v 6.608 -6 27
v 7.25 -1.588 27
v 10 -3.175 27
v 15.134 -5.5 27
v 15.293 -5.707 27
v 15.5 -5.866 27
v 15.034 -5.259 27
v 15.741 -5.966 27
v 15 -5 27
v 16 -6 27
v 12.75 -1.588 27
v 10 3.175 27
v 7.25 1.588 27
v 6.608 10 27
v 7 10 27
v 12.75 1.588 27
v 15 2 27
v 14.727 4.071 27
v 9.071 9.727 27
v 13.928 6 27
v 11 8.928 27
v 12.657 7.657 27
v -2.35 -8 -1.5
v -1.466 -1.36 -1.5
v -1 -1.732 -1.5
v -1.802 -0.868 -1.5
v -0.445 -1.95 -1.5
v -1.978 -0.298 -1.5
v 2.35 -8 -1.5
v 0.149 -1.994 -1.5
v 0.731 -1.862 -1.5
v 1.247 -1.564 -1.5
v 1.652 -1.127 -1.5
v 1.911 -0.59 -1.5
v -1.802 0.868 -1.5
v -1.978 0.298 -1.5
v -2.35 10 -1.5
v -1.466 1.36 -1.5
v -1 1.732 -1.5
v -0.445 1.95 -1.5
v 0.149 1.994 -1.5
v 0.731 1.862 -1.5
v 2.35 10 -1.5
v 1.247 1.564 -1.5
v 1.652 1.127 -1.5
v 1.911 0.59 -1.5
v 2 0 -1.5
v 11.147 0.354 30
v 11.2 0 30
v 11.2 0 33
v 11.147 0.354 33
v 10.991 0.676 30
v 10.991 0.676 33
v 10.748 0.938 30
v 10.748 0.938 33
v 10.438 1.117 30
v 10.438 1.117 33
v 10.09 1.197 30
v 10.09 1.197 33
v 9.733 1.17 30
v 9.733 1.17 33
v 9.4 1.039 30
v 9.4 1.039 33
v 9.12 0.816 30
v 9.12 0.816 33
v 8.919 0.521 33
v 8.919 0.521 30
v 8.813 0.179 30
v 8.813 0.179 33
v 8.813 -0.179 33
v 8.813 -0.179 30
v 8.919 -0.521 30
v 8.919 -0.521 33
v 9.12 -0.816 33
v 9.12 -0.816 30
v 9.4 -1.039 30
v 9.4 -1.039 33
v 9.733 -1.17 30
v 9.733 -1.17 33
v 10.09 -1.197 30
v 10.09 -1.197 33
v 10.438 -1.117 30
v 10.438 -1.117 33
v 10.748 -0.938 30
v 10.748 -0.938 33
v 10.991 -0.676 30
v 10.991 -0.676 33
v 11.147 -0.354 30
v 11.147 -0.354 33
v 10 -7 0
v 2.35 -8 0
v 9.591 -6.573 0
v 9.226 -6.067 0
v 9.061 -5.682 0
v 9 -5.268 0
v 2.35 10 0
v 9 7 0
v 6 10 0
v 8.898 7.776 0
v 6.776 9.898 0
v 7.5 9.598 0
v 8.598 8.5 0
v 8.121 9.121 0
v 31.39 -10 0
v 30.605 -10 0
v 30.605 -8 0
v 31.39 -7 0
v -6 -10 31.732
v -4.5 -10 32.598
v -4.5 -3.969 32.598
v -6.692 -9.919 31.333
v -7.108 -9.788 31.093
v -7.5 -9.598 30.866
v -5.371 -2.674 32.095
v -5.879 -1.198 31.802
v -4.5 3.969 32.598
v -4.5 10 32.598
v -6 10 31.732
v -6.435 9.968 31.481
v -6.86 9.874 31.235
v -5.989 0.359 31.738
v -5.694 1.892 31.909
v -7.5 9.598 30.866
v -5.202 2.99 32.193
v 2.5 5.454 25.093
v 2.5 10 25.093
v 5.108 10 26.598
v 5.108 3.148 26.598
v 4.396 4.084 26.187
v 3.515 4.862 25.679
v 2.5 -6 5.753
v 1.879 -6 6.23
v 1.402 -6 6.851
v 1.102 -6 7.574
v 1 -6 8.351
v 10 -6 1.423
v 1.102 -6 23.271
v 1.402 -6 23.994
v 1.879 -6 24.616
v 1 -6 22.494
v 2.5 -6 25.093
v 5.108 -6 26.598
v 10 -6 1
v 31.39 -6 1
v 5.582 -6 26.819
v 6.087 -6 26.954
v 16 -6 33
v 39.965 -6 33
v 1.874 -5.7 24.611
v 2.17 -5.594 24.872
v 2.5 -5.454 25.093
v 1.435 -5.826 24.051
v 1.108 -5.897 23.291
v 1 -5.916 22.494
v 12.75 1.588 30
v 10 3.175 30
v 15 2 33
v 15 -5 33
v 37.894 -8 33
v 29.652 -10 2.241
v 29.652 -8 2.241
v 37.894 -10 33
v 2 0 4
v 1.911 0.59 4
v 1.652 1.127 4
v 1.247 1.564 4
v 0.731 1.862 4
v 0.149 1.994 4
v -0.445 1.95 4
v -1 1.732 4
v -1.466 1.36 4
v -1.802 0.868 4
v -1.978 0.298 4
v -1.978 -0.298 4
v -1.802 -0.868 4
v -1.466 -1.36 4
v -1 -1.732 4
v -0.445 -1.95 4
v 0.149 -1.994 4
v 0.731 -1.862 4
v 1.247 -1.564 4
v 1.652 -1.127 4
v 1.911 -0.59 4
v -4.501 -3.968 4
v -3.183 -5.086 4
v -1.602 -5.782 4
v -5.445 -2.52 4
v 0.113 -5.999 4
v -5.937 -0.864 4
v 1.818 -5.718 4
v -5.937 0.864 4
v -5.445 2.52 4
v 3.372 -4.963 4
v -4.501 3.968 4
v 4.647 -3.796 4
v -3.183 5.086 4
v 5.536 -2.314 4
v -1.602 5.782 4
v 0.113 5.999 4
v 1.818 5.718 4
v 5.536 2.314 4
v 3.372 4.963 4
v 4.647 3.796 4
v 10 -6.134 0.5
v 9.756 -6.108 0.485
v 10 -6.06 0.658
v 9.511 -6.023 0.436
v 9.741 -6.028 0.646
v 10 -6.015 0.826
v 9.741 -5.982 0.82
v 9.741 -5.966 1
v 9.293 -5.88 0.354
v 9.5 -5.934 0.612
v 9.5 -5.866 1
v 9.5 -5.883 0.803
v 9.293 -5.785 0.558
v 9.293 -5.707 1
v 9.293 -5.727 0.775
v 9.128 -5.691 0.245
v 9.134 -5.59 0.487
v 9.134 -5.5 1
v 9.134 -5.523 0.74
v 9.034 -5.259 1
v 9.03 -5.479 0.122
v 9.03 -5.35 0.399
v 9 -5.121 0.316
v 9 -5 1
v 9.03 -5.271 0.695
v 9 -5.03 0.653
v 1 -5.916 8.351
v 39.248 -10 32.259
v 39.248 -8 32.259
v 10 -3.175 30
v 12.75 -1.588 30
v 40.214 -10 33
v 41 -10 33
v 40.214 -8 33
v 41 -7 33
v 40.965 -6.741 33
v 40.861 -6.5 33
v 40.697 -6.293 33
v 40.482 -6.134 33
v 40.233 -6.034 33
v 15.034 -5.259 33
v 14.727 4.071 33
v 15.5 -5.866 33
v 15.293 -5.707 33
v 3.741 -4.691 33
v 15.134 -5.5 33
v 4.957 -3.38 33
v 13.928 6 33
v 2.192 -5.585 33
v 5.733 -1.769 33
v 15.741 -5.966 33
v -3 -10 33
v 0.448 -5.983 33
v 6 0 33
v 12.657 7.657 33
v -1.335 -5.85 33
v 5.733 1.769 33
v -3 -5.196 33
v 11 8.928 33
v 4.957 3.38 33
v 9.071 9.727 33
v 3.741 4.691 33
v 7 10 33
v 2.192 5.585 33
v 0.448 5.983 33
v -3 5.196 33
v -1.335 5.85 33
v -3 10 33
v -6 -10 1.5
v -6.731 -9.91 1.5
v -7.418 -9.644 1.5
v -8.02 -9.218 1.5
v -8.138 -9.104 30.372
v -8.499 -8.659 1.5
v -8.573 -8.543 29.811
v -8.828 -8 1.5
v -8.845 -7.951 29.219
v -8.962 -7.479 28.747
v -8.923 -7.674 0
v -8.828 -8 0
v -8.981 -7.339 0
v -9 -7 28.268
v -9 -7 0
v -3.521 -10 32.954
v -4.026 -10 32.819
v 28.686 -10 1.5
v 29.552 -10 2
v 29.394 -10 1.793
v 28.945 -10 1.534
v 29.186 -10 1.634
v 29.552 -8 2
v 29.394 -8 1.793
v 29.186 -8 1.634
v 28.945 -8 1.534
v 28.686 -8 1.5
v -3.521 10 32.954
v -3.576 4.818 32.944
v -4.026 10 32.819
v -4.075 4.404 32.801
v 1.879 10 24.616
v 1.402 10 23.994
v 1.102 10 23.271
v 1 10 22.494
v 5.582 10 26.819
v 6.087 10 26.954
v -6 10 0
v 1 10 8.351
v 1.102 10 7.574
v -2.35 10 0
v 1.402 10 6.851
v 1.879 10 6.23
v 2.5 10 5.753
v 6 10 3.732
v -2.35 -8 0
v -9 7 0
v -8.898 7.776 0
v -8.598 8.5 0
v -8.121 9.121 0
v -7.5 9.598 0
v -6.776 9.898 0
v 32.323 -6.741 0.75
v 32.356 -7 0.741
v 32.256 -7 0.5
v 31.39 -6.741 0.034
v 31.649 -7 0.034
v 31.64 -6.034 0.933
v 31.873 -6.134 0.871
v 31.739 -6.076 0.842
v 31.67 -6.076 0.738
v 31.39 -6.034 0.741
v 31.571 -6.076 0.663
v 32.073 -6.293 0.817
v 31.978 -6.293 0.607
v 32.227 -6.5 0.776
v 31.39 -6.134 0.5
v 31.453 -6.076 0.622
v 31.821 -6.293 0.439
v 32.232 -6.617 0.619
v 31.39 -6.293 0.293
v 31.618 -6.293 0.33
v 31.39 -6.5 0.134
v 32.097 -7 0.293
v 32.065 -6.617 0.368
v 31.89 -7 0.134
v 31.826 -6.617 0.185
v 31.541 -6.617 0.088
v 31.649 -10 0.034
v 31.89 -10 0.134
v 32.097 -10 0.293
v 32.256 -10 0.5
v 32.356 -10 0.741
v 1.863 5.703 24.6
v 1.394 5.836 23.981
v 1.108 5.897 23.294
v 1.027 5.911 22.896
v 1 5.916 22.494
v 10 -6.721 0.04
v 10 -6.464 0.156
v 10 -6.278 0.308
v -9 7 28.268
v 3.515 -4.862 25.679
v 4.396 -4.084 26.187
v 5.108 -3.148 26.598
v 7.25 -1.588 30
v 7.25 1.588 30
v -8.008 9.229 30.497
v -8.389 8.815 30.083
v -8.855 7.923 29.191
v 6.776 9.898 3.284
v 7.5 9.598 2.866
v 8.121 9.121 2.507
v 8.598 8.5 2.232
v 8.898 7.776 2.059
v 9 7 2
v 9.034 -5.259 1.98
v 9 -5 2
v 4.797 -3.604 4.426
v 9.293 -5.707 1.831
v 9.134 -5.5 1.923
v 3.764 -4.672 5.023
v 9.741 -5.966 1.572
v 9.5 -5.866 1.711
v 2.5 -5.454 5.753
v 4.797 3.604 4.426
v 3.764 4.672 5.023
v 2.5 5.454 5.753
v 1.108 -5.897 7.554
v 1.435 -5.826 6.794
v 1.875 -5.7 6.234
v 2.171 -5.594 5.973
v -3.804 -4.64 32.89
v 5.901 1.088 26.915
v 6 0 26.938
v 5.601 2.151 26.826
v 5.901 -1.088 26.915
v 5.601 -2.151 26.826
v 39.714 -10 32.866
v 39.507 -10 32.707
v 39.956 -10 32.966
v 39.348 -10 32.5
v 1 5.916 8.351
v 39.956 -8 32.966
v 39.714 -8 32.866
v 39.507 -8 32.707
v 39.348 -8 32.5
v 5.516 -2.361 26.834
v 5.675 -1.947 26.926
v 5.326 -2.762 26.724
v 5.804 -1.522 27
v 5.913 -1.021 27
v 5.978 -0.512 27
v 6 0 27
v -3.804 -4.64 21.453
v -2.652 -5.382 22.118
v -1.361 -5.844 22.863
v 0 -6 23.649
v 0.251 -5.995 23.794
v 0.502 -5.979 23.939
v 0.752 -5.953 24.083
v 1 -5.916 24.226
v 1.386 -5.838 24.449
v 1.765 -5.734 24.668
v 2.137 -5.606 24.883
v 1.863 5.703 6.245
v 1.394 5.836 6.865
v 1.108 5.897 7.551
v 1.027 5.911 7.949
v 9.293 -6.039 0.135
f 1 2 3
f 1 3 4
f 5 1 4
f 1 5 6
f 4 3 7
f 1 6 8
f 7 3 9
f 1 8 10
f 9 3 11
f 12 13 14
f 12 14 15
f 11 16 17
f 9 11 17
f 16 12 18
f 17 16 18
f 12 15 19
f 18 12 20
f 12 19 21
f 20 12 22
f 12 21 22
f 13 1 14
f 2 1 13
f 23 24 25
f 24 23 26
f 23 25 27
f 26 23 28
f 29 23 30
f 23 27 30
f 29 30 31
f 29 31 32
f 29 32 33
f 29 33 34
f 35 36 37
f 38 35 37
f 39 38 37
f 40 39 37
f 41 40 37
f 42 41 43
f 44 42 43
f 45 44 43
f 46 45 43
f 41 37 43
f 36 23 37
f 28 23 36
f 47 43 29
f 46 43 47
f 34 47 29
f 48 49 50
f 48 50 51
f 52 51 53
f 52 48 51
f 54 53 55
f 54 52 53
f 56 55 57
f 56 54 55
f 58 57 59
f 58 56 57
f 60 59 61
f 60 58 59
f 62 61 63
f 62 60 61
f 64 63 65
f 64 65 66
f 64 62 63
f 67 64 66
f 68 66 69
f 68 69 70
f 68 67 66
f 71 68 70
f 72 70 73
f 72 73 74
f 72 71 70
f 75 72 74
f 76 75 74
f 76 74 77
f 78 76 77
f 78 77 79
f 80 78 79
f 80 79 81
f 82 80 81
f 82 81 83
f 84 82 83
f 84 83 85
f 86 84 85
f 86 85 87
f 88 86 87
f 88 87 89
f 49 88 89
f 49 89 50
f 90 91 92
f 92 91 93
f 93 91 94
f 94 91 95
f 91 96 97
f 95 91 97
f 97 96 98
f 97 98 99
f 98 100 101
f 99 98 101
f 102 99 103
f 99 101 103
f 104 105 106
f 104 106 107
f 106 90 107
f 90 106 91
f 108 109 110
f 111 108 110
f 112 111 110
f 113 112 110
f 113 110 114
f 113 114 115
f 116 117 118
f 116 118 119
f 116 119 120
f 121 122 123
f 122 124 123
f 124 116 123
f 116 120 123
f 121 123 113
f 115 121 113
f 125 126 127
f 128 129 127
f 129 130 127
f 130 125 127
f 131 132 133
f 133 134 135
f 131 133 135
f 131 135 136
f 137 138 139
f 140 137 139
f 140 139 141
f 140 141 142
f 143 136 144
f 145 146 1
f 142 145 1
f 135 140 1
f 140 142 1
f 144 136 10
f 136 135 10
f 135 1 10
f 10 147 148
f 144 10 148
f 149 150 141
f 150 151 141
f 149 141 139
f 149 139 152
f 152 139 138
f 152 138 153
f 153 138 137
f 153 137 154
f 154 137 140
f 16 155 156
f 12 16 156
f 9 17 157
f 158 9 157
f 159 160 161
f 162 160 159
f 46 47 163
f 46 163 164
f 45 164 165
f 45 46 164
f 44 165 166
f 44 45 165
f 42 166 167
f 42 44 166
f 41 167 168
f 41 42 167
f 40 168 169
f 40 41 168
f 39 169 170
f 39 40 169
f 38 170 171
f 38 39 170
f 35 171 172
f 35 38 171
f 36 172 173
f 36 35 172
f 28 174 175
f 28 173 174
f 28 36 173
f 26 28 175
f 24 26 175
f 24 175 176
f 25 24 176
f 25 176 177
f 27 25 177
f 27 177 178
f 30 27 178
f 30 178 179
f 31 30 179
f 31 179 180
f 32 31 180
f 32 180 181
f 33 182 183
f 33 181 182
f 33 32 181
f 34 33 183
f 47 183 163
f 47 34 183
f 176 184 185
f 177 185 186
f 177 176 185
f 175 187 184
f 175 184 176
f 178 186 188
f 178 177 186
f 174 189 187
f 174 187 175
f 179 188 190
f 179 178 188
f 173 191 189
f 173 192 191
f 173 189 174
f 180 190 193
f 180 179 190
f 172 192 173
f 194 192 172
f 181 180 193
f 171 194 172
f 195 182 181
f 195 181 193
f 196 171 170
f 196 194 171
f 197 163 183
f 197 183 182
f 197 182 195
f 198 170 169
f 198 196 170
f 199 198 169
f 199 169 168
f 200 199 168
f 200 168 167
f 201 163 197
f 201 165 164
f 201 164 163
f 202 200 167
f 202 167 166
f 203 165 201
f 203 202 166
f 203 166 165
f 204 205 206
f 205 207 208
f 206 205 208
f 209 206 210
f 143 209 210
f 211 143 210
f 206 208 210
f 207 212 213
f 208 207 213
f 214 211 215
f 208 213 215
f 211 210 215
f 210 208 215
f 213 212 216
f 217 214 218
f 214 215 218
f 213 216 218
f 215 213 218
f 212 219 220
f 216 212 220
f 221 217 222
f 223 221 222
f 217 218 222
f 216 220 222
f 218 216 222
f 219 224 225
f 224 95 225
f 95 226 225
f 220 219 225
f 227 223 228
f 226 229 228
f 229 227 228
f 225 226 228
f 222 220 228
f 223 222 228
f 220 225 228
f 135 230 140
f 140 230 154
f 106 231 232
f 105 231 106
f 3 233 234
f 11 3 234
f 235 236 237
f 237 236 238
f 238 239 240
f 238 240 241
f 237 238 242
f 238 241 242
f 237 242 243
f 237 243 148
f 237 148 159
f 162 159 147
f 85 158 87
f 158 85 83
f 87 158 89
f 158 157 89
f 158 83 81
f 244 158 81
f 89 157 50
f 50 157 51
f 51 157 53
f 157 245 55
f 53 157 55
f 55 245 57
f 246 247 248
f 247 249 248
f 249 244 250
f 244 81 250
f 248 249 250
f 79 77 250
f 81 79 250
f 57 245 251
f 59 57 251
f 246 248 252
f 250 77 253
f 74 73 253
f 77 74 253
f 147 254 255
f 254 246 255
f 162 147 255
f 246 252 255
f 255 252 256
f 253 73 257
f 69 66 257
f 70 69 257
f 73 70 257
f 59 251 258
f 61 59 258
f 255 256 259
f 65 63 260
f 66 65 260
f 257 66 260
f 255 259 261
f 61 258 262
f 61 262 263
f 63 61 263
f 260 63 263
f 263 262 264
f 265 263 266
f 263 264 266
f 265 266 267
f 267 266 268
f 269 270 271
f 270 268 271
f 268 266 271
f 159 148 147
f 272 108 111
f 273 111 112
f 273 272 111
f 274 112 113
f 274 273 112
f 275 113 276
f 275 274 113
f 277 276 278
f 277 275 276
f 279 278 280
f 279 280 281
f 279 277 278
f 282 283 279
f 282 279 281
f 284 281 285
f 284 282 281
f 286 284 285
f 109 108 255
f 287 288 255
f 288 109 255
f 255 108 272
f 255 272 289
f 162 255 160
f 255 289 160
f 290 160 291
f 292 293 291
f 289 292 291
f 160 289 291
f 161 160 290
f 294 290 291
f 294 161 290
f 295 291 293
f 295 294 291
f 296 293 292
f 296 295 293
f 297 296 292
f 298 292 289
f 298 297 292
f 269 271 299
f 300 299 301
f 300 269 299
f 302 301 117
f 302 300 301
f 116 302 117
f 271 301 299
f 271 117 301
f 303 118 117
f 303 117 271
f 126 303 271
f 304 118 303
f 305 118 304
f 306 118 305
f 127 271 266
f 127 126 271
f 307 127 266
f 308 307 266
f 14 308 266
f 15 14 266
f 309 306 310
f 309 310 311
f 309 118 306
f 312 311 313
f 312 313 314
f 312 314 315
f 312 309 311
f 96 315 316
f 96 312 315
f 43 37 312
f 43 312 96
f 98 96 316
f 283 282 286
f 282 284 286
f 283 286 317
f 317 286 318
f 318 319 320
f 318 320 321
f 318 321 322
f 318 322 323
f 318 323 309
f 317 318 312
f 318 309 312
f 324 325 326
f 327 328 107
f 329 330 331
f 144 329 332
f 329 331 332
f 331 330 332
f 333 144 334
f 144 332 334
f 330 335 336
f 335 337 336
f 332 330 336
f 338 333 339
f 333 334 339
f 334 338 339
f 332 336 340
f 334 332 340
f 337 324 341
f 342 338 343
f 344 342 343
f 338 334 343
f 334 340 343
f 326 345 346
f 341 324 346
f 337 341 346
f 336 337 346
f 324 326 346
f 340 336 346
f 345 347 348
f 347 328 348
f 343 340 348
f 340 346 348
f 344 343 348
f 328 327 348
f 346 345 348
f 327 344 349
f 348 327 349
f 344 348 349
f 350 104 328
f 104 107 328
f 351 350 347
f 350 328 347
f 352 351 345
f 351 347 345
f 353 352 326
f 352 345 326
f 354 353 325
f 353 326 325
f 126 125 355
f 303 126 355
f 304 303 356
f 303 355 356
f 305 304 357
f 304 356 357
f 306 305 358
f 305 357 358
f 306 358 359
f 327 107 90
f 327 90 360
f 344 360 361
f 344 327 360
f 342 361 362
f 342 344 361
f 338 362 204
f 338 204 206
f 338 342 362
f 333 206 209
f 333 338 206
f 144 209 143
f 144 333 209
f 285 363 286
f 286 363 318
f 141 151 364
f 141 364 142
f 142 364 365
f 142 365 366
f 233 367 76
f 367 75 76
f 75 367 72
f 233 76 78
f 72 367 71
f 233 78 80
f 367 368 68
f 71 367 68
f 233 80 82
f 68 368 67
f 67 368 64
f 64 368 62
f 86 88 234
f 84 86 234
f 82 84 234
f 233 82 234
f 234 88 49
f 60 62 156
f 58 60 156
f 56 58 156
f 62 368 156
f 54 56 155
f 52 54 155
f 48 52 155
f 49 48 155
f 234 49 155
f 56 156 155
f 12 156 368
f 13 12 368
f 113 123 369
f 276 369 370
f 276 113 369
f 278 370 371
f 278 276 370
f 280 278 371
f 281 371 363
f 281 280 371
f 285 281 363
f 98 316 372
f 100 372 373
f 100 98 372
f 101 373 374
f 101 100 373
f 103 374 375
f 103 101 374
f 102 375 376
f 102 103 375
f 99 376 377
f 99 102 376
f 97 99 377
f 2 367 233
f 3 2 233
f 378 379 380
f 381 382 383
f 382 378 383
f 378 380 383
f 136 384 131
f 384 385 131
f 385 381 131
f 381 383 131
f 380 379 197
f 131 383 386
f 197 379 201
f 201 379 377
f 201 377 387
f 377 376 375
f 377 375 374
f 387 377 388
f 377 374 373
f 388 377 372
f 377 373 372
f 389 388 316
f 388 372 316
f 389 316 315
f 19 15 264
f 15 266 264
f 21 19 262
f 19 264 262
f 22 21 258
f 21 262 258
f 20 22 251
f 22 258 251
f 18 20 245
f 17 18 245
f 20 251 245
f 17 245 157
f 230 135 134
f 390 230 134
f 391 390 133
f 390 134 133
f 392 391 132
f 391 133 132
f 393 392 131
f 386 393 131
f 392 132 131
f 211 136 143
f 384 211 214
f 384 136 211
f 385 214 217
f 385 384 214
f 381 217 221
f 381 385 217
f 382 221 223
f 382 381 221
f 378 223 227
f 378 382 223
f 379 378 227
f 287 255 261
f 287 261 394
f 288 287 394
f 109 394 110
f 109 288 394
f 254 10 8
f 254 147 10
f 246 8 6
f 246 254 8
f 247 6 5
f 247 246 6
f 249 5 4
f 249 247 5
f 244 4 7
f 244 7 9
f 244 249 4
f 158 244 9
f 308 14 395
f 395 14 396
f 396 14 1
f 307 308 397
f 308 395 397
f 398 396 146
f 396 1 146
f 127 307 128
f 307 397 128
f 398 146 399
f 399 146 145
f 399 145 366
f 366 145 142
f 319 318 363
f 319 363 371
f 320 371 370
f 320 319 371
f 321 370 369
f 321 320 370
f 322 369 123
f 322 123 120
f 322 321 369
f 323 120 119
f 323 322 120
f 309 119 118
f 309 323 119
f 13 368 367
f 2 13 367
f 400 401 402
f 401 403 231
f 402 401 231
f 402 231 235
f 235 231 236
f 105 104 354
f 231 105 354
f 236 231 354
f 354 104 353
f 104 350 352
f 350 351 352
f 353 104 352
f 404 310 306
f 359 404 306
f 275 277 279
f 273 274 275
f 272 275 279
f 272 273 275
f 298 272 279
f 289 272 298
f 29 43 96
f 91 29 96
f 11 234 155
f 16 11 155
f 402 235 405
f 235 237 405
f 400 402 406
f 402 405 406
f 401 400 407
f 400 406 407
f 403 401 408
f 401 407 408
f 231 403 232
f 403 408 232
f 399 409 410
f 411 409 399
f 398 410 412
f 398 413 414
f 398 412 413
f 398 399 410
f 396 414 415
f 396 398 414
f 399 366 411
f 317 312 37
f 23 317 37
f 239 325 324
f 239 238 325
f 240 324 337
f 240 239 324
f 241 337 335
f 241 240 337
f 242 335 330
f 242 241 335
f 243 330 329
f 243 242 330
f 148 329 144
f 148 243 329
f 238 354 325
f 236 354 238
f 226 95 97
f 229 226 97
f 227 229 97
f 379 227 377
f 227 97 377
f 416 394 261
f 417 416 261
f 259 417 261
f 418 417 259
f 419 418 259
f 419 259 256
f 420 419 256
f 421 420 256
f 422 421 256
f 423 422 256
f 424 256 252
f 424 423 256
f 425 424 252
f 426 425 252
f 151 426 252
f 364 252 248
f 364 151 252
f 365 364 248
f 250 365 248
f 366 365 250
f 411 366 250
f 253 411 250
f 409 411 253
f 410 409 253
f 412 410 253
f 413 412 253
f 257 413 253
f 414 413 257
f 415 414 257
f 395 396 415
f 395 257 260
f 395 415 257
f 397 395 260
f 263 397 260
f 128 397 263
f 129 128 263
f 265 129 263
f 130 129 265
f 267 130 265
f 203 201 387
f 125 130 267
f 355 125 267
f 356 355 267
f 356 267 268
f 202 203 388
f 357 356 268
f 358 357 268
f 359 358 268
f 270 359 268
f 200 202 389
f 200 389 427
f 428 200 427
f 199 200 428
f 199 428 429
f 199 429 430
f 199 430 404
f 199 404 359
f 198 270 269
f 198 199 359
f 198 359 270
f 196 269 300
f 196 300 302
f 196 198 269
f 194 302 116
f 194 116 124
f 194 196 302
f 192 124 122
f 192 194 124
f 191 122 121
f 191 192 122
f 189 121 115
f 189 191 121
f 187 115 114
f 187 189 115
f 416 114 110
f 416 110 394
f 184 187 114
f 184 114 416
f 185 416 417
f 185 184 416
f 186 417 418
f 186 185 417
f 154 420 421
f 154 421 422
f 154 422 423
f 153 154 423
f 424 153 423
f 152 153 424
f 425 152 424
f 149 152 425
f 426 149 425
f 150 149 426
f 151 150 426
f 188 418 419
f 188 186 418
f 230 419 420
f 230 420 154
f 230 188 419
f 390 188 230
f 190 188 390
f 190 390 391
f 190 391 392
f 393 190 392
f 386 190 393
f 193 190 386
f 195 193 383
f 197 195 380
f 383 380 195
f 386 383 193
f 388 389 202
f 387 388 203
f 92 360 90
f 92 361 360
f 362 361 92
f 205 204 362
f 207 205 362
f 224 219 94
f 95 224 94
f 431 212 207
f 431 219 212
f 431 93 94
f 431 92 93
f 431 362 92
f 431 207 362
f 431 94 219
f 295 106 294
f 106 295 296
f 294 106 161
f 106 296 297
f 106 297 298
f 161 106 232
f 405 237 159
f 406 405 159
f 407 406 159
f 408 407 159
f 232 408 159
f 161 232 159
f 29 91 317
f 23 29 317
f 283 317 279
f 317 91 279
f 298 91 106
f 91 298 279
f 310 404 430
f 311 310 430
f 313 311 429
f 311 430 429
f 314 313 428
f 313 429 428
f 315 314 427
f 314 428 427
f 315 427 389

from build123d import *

# Parameters (mm, degrees)
BOSS_EXTRU_1_DEPTH           = 10
ENL_V_MAT_EXTRU_1_DEPTH      = 29.854594898
ENL_V_MAT_EXTRU_1_DEPTH_BACK = 29.854594898
ESQUISSE2_R                  = 2
ENL_V_START                  = 4
ESQUISSE3_R                  = 6
ENL_V_MAT_EXTRU_2_DEPTH      = 25.390139133
BOSS_EXTRU_2_REACH           = 35.257
ENL_V_START_2                = -20
ESQUISSE7_R                  = 1.2
ESQUISSE7_R_2                = 6
ENL_V_MAT_EXTRU_4_DEPTH      = 20
CONG_1_START                 = -10
CONG_1_DEPTH                 = 20
CONG_1_2_DEPTH               = 20
CONG_1_3_DEPTH               = 4.545644043
CONG_1_START_2               = 5.454355957
CONG_1_4_DEPTH               = 4.545644043
CONG_1_START_3               = -7
CONG_1_5_DEPTH               = 14
CONG_1_START_4               = 5.752776733
CONG_1_6_OUTLINE_R           = 6
CONG_1_6_DEPTH               = 28.247223267
CONG_1_START_5               = -1.5
CONG_1_7_DEPTH               = 8.118802154
BOSS_EXTRU_3_DEPTH           = 4
ENL_V_MAT_EXTRU_5_DEPTH      = 2
CONG_2_R                     = 1
CONG_3_R                     = 1
ENL_V_START_3                = -3
ENL_V_MAT_EXTRU_6_DEPTH      = 6
CONG_4_R                     = 8


with BuildPart() as part:
    # Esquisse1 → Boss.-Extru.1 (new, symmetric)
    with BuildSketch(Plane(origin=(0, 0, 0), x_dir=(1, 0, 0), z_dir=(0, 1, 0))):
        Polygon((2.35, 0), (9, 0), (9, -2), (1, -6.618802154), (1, -25), (-9, -25), (-9, 0), (-2.35, 0), (-2.35, 1.5), (2.35, 1.5), align=None)
    extrude(amount=BOSS_EXTRU_1_DEPTH, both=True)

    # Esquisse2 → Enlèv. mat.-Extru.1 (cut, two sides: drawn at the far end of the back side and taken through both)
    with BuildSketch(Plane(origin=(-1.372446517, 0, 0), x_dir=(1, 0, 0), z_dir=(0, 0, 1)).offset(-ENL_V_MAT_EXTRU_1_DEPTH_BACK)):
        with Locations((1.372446517, 0)):
            Circle(ESQUISSE2_R)
    extrude(amount=ENL_V_MAT_EXTRU_1_DEPTH + ENL_V_MAT_EXTRU_1_DEPTH_BACK, mode=Mode.SUBTRACT)

    # Esquisse3 → Enlèv. mat.-Extru.2 (cut, through all)
    with BuildSketch(Plane.XY.offset(ENL_V_START)):
        Circle(ESQUISSE3_R)
    extrude(amount=ENL_V_MAT_EXTRU_2_DEPTH, mode=Mode.SUBTRACT)

    # Boss.-Extru.2: up to this face of the body (flat: up to its plane)
    boss_extru_2_end = Plane(part.part.faces().sort_by_distance((-2.923443816, -10, 10.980550797))[0])
    # Esquisse6 → Boss.-Extru.2 (add, up to the picked face)
    with BuildSketch(Plane(origin=(0, 10, 0), x_dir=(1, 0, 0), z_dir=(0, 1, 0)), mode=Mode.PRIVATE) as boss_extru_2_sk1:
        Polygon((-9, -18.452994616), (5.803847577, -27), (15, -27), (15, -33), (-3.803847577, -33), (-9, -30), align=None)
    boss_extru_2_tool1 = split(extrude(boss_extru_2_sk1.sketch, amount=-BOSS_EXTRU_2_REACH, mode=Mode.PRIVATE), bisect_by=boss_extru_2_end, keep=Keep.BOTH, mode=Mode.PRIVATE)
    add(boss_extru_2_tool1.solids().sort_by(Axis((1.160347, 10, 28.066771), (0, -1, 0)))[0])

    # Esquisse7 → Enlèv. mat.-Extru.4 (cut)
    with BuildSketch(Plane.XY.offset(33).offset(ENL_V_START_2)):
        with Locations((10, 0)):
            Circle(ESQUISSE7_R)
        with Locations(Location((0, 0, 0), (0, 0, 230.656026391))):
            Circle(ESQUISSE7_R_2)
    extrude(amount=ENL_V_MAT_EXTRU_4_DEPTH, mode=Mode.SUBTRACT)

    # Congé1: read off the stored shape, not the designer's step
    # Congé1 outline → Congé1 (cut)
    with BuildSketch(Plane(origin=(0, 0, 0), x_dir=(1, 0, 0), z_dir=(0, 1, 0)).offset(CONG_1_START)):
        with BuildLine():
            Line((-9, -30), (-7.5, -30.866025404))
            ThreePointArc((-7.5, -30.866025404), (-8.598076211, -29.767949192), (-9, -28.267949192))
            Line((-9, -28.267949192), (-9, -30))
        make_face()
    extrude(amount=CONG_1_DEPTH, mode=Mode.SUBTRACT)

    # Cong_1 2 outline → Cong_1 2 (cut)
    with BuildSketch(Plane(origin=(0, 0, 0), x_dir=(1, 0, 0), z_dir=(0, 1, 0)).offset(CONG_1_START)):
        with BuildLine():
            Line((-3.803847577, -33), (-3, -33))
            ThreePointArc((-3, -33), (-3.776457135, -32.897777479), (-4.5, -32.598076211))
            Line((-4.5, -32.598076211), (-3.803847577, -33))
        make_face()
    extrude(amount=CONG_1_2_DEPTH, mode=Mode.SUBTRACT)

    # Cong_1 3 outline → Cong_1 3 (add)
    with BuildSketch(Plane(origin=(0, 0, 0), x_dir=(1, 0, 0), z_dir=(0, 1, 0)).offset(CONG_1_START)):
        with BuildLine():
            Line((5.803847577, -27), (6.607695155, -27))
            ThreePointArc((6.607695155, -27), (5.83123802, -26.897777479), (5.107695155, -26.598076211))
            Line((5.107695155, -26.598076211), (5.803847577, -27))
        make_face()
        with BuildLine():
            Line((1, -6.618802154), (1, -8.350852961))
            ThreePointArc((1, -8.350852961), (1.401923789, -6.850852961), (2.5, -5.75277675))
            Line((2.5, -5.75277675), (1, -6.618802154))
        make_face()
        with BuildLine():
            Line((1, -24.226497308), (2.5, -25.092522712))
            ThreePointArc((2.5, -25.092522712), (1.401923789, -23.994446501), (1, -22.494446501))
            Line((1, -22.494446501), (1, -24.226497308))
        make_face()
    extrude(amount=CONG_1_3_DEPTH)

    # Cong_1 4 outline → Cong_1 4 (add)
    with BuildSketch(Plane(origin=(0, 0, 0), x_dir=(1, 0, 0), z_dir=(0, 1, 0)).offset(CONG_1_START_2)):
        with BuildLine():
            Line((5.803847577, -27), (6.607695155, -27))
            ThreePointArc((6.607695155, -27), (5.83123802, -26.897777479), (5.107695155, -26.598076211))
            Line((5.107695155, -26.598076211), (5.803847577, -27))
        make_face()
        with BuildLine():
            Line((1, -6.618802154), (1, -8.350852961))
            ThreePointArc((1, -8.350852961), (1.401923789, -6.850852961), (2.5, -5.75277675))
            Line((2.5, -5.75277675), (1, -6.618802154))
        make_face()
        with BuildLine():
            Line((1, -24.226497308), (2.5, -25.092522712))
            ThreePointArc((2.5, -25.092522712), (1.401923789, -23.994446501), (1, -22.494446501))
            Line((1, -22.494446501), (1, -24.226497308))
        make_face()
    extrude(amount=CONG_1_4_DEPTH)

    # Cong_1 5 outline → Cong_1 5 (add)
    with BuildSketch(Plane(origin=(0, 0, 0), x_dir=(1, 0, 0), z_dir=(0, 1, 0)).offset(CONG_1_START_3)):
        with BuildLine():
            Line((5.803847577, -27), (6.607695155, -27))
            ThreePointArc((6.607695155, -27), (5.83123802, -26.897777479), (5.107695155, -26.598076211))
            Line((5.107695155, -26.598076211), (5.803847577, -27))
        make_face()
    extrude(amount=CONG_1_5_DEPTH)

    # Cong_1 6 outline → Cong_1 6 (cut)
    with BuildSketch(Plane.XY.offset(CONG_1_START_4)):
        with BuildLine():
            Line((-9, 10), (-9, 7))
            ThreePointArc((-9, 7), (-8.121320344, 9.121320344), (-6, 10))
            Line((-6, 10), (-9, 10))
        make_face()
        with BuildLine():
            ThreePointArc((-6, -10), (-8.121320344, -9.121320344), (-9, -7))
            Line((-9, -7), (-9, -10))
            Line((-9, -10), (-6, -10))
        make_face()
        with BuildLine():
            Line((15, -10), (15, -7))
            ThreePointArc((15, -7), (14.121320344, -9.121320344), (12, -10))
            Line((12, -10), (15, -10))
        make_face()
        Circle(CONG_1_6_OUTLINE_R)
    extrude(amount=CONG_1_6_DEPTH, mode=Mode.SUBTRACT)

    # Cong_1 7 outline → Cong_1 7 (cut)
    with BuildSketch(Plane.XY.offset(CONG_1_START_5)):
        with BuildLine():
            Line((-9, 10), (-9, 7))
            ThreePointArc((-9, 7), (-8.121320344, 9.121320344), (-6, 10))
            Line((-6, 10), (-9, 10))
        make_face()
        with BuildLine():
            ThreePointArc((-6, -10), (-8.121320344, -9.121320344), (-9, -7))
            Line((-9, -7), (-9, -10))
            Line((-9, -10), (-6, -10))
        make_face()
        with BuildLine():
            Line((9, 10), (6, 10))
            ThreePointArc((6, 10), (8.121320344, 9.121320344), (9, 7))
            Line((9, 7), (9, 10))
        make_face()
        with BuildLine():
            ThreePointArc((9, -7), (8.121320344, -9.121320344), (6, -10))
            Line((6, -10), (9, -10))
            Line((9, -10), (9, -7))
        make_face()
    extrude(amount=CONG_1_7_DEPTH, mode=Mode.SUBTRACT)

    # Esquisse8 → Boss.-Extru.3 (add)
    with BuildSketch(Plane.XZ.offset(10)):
        Polygon((-2.35, 0), (32.15767665, 0), (41, 33), (-2.35, 33), align=None)
    extrude(amount=-BOSS_EXTRU_3_DEPTH)

    # Esquisse9 → Enlèv. mat.-Extru.5 (cut)
    with BuildSketch(Plane.XZ.offset(10)):
        Polygon((-9, 1.5), (29.453771897, 1.5), (37.894171459, 33), (39.447085729, 33), (30.202838591, -1.5), (-9, -1.5), align=None)
    extrude(amount=-ENL_V_MAT_EXTRU_5_DEPTH, mode=Mode.SUBTRACT)

    # Congé2
    cong_2_edges = [part.edges().sort_by_distance(p)[0] for p in [
        (39.447085729, -9, 33),
        (29.453771897, -9, 1.5),
        (32.15767665, -8, 0),
        (36.578838325, -6, 16.5),
        (15, -6, 30),
        (20.578838325, -6, 0),
    ]]
    fillet(cong_2_edges, radius=CONG_2_R)

    # Congé3
    cong_3_edges = [part.edges().sort_by_distance(p)[0] for p in [
        (9, -6, 1.5),
        (9, -6.292893219, 0.292893219),
    ]]
    fillet(cong_3_edges, radius=CONG_3_R)

    # Esquisse10 → Enlèv. mat.-Extru.6 (cut)
    with BuildSketch(Plane.XY.offset(33).offset(ENL_V_START_3)):
        Polygon((12.75, 1.58771324), (10, 3.175426481), (7.25, 1.58771324), (7.25, -1.58771324), (10, -3.175426481), (12.75, -1.58771324), align=None)
    extrude(amount=-ENL_V_MAT_EXTRU_6_DEPTH, mode=Mode.SUBTRACT)

    # Congé4
    cong_4_edges = [part.edges().sort_by_distance(p)[0] for p in [
        (15, 10, 30),
    ]]
    fillet(cong_4_edges, radius=CONG_4_R)


solid = part.part
